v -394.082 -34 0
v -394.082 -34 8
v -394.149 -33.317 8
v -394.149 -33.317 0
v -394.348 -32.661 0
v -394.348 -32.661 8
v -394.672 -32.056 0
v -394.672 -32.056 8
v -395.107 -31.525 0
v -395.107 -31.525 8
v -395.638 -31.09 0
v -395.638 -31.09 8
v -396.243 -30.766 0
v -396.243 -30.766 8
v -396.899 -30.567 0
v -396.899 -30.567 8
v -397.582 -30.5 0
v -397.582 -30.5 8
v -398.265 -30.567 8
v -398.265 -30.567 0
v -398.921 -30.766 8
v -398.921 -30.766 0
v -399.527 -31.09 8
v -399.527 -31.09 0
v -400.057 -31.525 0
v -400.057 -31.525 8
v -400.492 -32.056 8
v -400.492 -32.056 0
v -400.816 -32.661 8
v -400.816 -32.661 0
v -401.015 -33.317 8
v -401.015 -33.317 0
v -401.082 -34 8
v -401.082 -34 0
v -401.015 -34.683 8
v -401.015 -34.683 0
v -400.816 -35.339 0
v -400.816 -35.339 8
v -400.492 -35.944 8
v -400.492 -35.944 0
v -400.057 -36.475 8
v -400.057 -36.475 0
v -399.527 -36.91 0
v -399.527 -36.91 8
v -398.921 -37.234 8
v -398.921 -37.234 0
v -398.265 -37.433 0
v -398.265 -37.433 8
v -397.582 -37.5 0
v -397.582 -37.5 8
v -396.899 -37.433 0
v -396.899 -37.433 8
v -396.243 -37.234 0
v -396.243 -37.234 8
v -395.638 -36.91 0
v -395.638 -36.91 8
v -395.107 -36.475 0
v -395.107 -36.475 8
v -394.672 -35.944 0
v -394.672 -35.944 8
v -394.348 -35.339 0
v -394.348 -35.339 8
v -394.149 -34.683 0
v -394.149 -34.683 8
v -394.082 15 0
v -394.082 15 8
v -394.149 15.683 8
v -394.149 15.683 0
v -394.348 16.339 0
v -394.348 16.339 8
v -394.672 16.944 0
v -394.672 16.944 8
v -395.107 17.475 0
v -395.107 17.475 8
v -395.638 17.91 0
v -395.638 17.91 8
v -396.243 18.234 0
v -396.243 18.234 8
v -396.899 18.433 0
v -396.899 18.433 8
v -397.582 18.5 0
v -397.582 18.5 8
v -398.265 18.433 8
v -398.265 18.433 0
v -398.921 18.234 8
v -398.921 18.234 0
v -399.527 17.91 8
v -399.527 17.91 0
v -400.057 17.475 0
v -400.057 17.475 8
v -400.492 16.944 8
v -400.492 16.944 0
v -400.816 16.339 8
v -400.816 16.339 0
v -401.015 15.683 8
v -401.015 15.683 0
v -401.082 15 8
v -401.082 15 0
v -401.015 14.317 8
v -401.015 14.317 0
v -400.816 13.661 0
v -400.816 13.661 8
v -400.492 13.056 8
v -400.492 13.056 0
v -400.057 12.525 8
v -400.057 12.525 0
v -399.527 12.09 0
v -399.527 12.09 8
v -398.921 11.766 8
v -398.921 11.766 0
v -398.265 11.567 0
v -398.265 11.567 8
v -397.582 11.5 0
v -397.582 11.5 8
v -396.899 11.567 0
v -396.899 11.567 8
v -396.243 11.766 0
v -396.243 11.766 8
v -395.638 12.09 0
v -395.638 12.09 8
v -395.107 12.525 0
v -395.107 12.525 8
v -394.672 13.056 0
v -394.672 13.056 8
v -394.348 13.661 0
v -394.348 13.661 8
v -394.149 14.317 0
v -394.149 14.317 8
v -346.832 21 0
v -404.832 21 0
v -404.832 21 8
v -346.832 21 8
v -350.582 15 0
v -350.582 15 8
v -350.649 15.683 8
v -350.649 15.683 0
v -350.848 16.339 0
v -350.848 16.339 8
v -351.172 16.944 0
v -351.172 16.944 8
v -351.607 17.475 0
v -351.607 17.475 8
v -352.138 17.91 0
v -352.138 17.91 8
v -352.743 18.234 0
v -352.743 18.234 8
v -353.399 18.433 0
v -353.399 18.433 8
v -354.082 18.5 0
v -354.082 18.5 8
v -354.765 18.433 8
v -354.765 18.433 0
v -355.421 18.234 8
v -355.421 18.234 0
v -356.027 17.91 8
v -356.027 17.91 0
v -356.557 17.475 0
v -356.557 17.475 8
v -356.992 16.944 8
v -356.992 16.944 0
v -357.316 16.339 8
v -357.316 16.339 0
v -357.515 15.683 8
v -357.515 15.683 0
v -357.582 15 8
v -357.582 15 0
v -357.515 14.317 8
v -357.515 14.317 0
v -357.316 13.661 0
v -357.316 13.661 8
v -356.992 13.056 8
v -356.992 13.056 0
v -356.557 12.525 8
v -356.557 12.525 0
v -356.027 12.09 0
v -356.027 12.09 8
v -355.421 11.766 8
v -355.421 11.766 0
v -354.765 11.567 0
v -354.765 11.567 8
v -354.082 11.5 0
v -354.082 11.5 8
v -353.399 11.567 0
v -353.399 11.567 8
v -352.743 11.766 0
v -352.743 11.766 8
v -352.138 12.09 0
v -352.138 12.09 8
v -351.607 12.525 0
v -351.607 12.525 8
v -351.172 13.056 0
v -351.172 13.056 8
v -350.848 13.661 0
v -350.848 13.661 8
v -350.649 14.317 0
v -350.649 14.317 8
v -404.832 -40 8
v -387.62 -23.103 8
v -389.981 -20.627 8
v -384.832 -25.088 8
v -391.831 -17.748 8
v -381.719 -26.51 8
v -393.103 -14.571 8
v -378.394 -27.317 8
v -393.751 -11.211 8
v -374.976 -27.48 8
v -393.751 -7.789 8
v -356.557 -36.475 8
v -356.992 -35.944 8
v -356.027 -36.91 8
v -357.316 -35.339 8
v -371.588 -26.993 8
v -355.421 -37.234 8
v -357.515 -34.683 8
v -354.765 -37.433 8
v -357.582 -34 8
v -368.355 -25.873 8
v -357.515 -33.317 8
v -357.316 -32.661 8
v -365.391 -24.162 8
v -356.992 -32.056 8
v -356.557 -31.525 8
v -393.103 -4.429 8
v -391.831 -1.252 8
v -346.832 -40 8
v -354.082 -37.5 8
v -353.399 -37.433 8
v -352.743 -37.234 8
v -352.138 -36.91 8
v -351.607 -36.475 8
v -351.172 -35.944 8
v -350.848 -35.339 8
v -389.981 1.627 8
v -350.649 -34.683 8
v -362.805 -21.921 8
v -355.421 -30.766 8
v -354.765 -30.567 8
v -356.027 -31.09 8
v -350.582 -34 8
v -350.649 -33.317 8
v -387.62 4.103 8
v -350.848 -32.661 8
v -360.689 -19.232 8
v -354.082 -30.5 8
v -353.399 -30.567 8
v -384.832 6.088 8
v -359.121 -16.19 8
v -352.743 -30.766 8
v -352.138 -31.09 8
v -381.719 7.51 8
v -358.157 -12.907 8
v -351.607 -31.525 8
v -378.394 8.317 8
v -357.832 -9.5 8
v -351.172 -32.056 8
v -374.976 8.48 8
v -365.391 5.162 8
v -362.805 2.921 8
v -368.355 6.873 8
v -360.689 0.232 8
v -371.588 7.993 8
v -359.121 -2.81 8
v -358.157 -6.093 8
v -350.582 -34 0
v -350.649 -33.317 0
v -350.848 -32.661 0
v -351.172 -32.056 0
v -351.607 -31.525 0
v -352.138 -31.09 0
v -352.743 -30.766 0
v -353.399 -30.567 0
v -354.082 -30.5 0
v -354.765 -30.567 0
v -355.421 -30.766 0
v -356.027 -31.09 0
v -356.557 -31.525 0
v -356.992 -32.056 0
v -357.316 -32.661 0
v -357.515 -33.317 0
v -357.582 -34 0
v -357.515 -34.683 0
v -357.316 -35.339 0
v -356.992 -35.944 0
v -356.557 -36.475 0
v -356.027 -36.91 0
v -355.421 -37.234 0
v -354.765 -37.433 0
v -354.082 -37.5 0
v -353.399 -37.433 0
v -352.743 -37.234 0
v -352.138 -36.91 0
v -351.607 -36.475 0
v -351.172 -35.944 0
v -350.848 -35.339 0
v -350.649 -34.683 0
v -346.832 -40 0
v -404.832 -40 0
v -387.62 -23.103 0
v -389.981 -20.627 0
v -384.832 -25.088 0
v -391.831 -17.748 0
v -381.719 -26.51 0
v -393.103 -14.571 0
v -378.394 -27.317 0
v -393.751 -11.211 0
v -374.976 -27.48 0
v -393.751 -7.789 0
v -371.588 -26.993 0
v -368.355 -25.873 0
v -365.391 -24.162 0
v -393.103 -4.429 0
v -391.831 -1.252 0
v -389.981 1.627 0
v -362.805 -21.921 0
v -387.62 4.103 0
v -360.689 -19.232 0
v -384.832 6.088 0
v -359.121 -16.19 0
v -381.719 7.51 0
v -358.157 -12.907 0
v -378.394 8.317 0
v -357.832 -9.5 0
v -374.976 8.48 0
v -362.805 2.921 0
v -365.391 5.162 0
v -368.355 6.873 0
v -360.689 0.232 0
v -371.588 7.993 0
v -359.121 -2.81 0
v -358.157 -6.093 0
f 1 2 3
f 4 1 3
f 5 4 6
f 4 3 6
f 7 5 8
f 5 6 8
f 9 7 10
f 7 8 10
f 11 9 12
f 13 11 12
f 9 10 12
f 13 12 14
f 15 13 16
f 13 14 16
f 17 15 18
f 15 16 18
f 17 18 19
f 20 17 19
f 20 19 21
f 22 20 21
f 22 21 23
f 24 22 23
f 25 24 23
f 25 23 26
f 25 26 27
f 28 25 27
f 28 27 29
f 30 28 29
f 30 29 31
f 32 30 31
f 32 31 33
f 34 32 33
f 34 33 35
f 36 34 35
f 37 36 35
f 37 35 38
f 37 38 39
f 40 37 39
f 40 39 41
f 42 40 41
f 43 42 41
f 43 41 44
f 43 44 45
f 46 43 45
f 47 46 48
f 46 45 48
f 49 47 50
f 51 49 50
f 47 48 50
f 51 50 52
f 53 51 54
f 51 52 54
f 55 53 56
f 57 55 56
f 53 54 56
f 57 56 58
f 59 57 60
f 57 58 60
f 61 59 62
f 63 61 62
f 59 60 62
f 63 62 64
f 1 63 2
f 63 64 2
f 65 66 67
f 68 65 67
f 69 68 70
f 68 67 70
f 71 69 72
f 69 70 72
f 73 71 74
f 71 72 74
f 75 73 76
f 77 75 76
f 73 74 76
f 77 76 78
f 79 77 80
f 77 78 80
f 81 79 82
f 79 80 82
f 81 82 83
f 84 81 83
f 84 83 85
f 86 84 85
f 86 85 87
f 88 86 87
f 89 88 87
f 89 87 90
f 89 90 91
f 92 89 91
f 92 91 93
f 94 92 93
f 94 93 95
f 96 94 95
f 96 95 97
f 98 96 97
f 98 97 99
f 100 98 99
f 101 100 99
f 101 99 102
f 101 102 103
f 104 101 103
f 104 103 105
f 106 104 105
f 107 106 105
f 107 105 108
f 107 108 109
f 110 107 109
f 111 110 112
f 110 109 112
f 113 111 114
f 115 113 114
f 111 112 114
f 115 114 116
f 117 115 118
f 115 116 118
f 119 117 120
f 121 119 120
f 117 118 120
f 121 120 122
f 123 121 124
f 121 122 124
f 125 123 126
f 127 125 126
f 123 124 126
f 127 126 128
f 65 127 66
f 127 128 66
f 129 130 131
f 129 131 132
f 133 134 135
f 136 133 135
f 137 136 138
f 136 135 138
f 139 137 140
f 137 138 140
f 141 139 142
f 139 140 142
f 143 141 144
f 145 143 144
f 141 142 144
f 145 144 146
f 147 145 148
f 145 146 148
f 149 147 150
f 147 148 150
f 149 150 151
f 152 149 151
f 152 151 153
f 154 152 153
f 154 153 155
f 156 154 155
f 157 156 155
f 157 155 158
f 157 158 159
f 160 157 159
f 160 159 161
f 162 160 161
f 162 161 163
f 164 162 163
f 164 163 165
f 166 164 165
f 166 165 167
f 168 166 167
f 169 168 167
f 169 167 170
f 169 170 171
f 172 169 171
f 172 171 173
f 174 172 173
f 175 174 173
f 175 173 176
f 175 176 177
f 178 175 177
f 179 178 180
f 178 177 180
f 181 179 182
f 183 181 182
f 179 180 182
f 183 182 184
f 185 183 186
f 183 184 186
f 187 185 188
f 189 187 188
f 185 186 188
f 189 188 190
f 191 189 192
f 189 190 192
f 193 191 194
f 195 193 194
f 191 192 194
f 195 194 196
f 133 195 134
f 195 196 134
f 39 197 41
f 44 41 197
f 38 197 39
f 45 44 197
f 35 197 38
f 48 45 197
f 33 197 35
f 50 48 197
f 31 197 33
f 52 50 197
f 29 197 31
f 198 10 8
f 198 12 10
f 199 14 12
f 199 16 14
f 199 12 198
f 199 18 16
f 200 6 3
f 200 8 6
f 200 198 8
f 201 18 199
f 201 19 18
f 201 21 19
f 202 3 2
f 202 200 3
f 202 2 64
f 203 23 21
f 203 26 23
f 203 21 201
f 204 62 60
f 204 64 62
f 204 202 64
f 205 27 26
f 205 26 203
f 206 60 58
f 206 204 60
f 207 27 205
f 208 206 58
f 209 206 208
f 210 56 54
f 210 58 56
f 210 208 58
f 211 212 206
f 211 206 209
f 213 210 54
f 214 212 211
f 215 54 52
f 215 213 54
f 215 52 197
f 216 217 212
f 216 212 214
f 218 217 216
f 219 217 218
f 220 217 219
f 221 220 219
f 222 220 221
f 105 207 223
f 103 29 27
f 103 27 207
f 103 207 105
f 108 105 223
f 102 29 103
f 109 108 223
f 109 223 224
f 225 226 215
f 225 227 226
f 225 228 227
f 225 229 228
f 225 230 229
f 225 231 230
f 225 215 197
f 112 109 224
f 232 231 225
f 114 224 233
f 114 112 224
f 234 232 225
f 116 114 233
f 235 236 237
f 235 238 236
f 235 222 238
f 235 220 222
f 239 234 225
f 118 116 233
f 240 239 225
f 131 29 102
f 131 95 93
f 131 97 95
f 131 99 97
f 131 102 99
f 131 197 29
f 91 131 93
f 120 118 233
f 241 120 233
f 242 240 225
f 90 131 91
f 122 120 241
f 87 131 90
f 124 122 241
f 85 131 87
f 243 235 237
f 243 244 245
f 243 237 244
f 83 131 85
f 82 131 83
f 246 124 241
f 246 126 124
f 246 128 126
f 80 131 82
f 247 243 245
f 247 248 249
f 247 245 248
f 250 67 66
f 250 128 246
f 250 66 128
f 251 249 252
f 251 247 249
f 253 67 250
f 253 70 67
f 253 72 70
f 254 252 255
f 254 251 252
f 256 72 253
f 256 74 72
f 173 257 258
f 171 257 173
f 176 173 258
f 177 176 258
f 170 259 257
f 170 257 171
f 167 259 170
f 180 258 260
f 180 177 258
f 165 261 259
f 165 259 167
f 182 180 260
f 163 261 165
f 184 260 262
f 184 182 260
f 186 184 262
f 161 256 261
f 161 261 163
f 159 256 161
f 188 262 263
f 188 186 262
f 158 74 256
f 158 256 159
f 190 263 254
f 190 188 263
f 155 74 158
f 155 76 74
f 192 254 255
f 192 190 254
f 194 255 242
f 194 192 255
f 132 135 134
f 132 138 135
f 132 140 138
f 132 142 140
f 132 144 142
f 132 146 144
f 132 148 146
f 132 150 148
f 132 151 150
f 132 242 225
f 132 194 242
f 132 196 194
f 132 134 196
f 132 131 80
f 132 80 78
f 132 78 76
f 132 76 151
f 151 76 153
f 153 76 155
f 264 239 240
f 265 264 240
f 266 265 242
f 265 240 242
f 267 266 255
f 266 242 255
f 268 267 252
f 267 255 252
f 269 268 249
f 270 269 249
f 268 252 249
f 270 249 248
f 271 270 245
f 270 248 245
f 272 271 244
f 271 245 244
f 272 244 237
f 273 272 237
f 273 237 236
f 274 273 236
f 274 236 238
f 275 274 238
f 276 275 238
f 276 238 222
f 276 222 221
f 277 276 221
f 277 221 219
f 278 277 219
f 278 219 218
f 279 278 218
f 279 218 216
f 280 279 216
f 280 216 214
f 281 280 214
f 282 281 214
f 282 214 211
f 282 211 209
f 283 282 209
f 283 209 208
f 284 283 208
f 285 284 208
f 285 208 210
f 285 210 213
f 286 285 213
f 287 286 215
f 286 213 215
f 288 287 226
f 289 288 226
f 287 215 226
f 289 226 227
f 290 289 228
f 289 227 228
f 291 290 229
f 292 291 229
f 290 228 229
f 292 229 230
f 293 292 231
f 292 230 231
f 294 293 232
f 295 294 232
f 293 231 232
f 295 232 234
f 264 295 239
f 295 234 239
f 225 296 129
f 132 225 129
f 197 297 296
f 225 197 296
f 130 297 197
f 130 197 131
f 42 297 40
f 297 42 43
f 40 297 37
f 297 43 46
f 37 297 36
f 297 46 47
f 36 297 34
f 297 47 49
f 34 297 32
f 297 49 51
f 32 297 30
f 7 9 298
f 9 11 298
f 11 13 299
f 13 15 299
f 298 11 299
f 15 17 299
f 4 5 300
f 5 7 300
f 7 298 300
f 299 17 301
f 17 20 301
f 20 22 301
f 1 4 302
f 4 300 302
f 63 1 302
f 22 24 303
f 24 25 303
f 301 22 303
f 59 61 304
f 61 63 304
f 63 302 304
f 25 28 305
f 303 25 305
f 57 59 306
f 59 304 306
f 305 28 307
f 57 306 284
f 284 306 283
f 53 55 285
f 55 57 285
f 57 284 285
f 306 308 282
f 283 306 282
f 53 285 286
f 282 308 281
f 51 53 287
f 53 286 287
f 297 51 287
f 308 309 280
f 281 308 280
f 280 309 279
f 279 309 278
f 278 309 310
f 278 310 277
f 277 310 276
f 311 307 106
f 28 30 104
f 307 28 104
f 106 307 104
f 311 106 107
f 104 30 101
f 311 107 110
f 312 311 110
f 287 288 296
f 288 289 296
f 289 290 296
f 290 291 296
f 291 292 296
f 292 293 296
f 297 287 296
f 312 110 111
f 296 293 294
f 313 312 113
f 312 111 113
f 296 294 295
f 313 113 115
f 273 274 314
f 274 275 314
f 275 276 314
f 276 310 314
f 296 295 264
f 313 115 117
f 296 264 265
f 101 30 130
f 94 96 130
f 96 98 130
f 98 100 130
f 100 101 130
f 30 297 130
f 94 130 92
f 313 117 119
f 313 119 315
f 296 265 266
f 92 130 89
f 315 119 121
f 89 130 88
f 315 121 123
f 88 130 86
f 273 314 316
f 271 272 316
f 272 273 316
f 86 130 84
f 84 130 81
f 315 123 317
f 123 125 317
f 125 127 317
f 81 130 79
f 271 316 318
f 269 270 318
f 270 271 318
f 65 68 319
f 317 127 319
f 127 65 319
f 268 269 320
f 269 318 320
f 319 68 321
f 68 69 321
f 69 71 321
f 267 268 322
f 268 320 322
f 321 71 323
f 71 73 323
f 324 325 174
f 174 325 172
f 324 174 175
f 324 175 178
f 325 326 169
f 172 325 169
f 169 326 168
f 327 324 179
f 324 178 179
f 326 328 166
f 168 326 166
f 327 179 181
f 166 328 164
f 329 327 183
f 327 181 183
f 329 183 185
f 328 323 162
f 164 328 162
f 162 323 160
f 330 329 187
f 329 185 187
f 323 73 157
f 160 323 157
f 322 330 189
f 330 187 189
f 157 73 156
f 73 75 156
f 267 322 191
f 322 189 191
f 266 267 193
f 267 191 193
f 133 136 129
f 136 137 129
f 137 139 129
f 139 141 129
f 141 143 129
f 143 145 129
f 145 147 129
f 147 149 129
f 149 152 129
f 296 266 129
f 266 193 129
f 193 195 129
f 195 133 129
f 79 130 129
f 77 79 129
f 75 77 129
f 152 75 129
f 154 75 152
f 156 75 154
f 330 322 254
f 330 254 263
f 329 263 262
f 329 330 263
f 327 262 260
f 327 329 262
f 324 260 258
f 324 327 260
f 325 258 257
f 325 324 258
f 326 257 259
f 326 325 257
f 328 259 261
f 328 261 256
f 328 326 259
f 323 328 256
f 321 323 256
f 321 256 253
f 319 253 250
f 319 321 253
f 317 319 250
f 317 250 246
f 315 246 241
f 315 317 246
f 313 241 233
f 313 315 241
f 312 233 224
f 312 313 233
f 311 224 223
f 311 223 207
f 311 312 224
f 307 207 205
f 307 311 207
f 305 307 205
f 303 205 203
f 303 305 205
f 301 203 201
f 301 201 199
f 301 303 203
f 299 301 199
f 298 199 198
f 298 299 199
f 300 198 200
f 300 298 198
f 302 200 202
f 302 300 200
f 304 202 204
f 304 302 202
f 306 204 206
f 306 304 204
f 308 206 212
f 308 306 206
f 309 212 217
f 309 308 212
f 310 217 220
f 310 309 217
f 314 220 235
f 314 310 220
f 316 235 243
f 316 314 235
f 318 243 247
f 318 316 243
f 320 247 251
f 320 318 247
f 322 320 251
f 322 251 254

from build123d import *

# Parameters (mm, degrees)
SKETCH1_W           = 58
SKETCH1_H           = 61
SKETCH1_R           = 18
BOSS_EXTRUDE1_DEPTH = 8
SKETCH26_R          = 12.25
SKETCH26_R_2        = 3.500000003
SKETCH26_R_3        = 2.7
CUT_EXTRUDE25_DEPTH = 80


with BuildPart() as part:
    # Sketch1 → Boss-Extrude1 (new body)
    with BuildSketch(Plane.XY):
        with Locations((-375.83204095, -9.5)):
            Rectangle(SKETCH1_W, SKETCH1_H)
        with Locations((-375.83204095, -9.5)):
            Circle(SKETCH1_R, mode=Mode.SUBTRACT)
    extrude(amount=BOSS_EXTRUDE1_DEPTH)

    # Sketch26 → Cut-Extrude25 (cut)
    with BuildSketch(Plane(origin=(-392.722155748, 41.581437247, 68), x_dir=(-1, 0, 0), z_dir=(0, 0, 1))):
        with Locations((-16.890114798, 51.081437247)):
            Circle(SKETCH26_R)
        with Locations(Location((-38.640114797, 75.581437247, 0), (0, 0, 180))):
            Circle(SKETCH26_R_2)
        with Locations(Location((4.859885202, 75.581437247, 0), (0, 0, 180))):
            Circle(SKETCH26_R_2)
        with Locations(Location((-38.640114797, 26.581437247, 0), (0, 0, 180))):
            Circle(SKETCH26_R_2)
        with Locations(Location((4.859885202, 26.581437247, 0), (0, 0, 180))):
            Circle(SKETCH26_R_2)
        with Locations((-16.890114798, 16.121848563)):
            Circle(SKETCH26_R_3)
    extrude(amount=-CUT_EXTRUDE25_DEPTH, mode=Mode.SUBTRACT)


solid = part.part
